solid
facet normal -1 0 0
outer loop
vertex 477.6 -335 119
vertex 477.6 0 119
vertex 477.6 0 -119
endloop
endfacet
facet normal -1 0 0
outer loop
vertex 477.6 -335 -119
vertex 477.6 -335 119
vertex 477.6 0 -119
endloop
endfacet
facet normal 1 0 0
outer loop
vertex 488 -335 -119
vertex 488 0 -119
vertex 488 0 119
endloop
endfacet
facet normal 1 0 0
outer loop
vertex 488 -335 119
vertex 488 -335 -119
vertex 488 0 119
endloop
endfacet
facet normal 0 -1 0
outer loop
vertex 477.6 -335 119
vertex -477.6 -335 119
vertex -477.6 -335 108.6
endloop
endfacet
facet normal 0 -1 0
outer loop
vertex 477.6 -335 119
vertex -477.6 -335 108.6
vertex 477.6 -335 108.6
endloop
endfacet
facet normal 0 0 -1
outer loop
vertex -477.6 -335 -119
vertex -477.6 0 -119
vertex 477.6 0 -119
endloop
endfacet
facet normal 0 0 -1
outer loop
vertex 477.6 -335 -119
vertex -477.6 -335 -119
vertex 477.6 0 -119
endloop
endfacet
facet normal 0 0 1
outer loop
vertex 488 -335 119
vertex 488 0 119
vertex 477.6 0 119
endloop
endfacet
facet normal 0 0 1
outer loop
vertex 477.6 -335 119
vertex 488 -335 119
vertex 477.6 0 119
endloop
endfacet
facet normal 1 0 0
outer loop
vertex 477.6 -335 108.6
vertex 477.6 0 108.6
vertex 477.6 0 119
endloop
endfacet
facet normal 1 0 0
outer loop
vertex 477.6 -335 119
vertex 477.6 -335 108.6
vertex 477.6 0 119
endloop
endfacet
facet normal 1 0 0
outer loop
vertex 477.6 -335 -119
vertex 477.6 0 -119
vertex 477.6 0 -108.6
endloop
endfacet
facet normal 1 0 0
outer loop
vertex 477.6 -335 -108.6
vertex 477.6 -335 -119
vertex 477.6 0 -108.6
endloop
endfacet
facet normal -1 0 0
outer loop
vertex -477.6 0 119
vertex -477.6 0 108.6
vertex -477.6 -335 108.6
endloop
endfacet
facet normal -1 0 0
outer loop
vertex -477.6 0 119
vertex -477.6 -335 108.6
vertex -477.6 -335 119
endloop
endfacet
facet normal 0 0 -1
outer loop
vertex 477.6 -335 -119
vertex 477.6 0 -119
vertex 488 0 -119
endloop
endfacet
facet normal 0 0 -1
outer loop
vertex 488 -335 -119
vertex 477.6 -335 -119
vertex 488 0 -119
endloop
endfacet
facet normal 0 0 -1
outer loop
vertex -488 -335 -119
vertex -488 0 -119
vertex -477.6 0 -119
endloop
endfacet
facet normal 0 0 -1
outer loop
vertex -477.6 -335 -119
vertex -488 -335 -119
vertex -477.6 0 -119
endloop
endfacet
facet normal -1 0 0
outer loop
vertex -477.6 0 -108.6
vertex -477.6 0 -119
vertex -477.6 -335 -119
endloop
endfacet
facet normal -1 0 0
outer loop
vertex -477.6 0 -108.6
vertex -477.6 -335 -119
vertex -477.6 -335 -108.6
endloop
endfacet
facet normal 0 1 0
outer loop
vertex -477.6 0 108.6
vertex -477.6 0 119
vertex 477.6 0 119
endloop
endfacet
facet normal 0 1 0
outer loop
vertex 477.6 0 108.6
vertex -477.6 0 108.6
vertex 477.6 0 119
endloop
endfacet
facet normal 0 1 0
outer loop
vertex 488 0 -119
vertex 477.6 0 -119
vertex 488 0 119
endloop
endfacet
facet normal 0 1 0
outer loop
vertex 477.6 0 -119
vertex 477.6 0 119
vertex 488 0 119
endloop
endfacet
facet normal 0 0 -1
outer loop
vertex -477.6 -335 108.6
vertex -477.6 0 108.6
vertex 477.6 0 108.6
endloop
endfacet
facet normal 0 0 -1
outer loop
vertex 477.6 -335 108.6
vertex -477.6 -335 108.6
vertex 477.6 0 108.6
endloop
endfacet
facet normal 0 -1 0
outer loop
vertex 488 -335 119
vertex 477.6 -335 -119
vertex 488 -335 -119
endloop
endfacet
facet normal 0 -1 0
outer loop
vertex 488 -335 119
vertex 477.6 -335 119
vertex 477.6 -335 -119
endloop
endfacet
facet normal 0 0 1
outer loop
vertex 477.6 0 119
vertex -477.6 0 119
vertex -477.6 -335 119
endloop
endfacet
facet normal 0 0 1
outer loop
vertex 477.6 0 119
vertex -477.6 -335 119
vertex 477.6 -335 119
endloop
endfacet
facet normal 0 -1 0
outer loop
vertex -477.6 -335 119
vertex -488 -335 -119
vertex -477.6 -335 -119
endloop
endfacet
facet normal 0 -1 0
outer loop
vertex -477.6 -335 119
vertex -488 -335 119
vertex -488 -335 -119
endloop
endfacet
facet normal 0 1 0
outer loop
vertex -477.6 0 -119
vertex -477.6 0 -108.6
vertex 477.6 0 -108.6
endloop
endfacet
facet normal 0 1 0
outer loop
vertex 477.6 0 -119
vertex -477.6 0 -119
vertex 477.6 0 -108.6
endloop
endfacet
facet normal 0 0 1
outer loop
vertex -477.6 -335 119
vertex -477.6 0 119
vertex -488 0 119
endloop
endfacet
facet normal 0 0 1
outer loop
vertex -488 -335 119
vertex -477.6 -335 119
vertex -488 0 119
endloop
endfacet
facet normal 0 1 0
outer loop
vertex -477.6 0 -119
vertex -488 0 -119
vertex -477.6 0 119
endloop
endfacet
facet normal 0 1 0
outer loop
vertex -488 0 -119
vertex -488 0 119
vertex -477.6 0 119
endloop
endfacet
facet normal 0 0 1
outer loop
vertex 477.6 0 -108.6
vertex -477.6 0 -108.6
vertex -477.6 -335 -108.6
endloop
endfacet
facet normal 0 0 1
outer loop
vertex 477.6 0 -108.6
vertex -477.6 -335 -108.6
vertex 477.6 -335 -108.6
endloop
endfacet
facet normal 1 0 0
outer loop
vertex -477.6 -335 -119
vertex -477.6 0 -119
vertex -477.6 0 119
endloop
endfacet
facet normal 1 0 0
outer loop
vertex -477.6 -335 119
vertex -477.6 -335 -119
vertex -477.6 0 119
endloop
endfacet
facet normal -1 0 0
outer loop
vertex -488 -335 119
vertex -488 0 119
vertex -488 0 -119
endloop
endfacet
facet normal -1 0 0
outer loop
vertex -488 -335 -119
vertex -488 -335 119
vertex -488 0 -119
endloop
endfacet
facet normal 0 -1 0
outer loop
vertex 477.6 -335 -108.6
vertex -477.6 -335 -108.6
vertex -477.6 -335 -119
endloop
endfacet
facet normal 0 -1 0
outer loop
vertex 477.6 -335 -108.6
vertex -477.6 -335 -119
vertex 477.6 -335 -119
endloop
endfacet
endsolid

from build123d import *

# Parameters (mm, degrees)
F0_W     = 955.2
F0_H     = 10.4
F1_DEPTH = 335
F2_DEPTH = 335


with BuildPart() as f1:
    # F0 (on Front) → F1 (new body)
    with BuildSketch(Plane.XZ):
        with Locations((0, -113.8)):
            Rectangle(F0_W, F0_H)
    extrude(amount=F1_DEPTH)


with BuildPart() as f1b:
    # F0 (on Front) → F1, piece 2 (new body)
    with BuildSketch(Plane.XZ):
        with Locations((0, 113.8)):
            Rectangle(F0_W, F0_H)
    extrude(amount=F1_DEPTH)


with BuildPart() as f2:
    # F0 (on Front) → F2 (new body, through all)
    with BuildSketch(Plane.XZ):
        Polygon((-488, -119), (-477.6, -119), (-477.6, -108.6), (-477.6, 108.6), (-477.6, 119), (-488, 119), align=None)
    extrude(amount=F2_DEPTH)


with BuildPart() as f2b:
    # F0 (on Front) → F2, piece 2 (new body, through all)
    with BuildSketch(Plane.XZ):
        Polygon((477.6, -119), (488, -119), (488, 119), (477.6, 119), (477.6, 108.6), (477.6, -108.6), align=None)
    extrude(amount=F2_DEPTH)


solid = Compound([f1.part, f1b.part, f2.part, f2b.part])
